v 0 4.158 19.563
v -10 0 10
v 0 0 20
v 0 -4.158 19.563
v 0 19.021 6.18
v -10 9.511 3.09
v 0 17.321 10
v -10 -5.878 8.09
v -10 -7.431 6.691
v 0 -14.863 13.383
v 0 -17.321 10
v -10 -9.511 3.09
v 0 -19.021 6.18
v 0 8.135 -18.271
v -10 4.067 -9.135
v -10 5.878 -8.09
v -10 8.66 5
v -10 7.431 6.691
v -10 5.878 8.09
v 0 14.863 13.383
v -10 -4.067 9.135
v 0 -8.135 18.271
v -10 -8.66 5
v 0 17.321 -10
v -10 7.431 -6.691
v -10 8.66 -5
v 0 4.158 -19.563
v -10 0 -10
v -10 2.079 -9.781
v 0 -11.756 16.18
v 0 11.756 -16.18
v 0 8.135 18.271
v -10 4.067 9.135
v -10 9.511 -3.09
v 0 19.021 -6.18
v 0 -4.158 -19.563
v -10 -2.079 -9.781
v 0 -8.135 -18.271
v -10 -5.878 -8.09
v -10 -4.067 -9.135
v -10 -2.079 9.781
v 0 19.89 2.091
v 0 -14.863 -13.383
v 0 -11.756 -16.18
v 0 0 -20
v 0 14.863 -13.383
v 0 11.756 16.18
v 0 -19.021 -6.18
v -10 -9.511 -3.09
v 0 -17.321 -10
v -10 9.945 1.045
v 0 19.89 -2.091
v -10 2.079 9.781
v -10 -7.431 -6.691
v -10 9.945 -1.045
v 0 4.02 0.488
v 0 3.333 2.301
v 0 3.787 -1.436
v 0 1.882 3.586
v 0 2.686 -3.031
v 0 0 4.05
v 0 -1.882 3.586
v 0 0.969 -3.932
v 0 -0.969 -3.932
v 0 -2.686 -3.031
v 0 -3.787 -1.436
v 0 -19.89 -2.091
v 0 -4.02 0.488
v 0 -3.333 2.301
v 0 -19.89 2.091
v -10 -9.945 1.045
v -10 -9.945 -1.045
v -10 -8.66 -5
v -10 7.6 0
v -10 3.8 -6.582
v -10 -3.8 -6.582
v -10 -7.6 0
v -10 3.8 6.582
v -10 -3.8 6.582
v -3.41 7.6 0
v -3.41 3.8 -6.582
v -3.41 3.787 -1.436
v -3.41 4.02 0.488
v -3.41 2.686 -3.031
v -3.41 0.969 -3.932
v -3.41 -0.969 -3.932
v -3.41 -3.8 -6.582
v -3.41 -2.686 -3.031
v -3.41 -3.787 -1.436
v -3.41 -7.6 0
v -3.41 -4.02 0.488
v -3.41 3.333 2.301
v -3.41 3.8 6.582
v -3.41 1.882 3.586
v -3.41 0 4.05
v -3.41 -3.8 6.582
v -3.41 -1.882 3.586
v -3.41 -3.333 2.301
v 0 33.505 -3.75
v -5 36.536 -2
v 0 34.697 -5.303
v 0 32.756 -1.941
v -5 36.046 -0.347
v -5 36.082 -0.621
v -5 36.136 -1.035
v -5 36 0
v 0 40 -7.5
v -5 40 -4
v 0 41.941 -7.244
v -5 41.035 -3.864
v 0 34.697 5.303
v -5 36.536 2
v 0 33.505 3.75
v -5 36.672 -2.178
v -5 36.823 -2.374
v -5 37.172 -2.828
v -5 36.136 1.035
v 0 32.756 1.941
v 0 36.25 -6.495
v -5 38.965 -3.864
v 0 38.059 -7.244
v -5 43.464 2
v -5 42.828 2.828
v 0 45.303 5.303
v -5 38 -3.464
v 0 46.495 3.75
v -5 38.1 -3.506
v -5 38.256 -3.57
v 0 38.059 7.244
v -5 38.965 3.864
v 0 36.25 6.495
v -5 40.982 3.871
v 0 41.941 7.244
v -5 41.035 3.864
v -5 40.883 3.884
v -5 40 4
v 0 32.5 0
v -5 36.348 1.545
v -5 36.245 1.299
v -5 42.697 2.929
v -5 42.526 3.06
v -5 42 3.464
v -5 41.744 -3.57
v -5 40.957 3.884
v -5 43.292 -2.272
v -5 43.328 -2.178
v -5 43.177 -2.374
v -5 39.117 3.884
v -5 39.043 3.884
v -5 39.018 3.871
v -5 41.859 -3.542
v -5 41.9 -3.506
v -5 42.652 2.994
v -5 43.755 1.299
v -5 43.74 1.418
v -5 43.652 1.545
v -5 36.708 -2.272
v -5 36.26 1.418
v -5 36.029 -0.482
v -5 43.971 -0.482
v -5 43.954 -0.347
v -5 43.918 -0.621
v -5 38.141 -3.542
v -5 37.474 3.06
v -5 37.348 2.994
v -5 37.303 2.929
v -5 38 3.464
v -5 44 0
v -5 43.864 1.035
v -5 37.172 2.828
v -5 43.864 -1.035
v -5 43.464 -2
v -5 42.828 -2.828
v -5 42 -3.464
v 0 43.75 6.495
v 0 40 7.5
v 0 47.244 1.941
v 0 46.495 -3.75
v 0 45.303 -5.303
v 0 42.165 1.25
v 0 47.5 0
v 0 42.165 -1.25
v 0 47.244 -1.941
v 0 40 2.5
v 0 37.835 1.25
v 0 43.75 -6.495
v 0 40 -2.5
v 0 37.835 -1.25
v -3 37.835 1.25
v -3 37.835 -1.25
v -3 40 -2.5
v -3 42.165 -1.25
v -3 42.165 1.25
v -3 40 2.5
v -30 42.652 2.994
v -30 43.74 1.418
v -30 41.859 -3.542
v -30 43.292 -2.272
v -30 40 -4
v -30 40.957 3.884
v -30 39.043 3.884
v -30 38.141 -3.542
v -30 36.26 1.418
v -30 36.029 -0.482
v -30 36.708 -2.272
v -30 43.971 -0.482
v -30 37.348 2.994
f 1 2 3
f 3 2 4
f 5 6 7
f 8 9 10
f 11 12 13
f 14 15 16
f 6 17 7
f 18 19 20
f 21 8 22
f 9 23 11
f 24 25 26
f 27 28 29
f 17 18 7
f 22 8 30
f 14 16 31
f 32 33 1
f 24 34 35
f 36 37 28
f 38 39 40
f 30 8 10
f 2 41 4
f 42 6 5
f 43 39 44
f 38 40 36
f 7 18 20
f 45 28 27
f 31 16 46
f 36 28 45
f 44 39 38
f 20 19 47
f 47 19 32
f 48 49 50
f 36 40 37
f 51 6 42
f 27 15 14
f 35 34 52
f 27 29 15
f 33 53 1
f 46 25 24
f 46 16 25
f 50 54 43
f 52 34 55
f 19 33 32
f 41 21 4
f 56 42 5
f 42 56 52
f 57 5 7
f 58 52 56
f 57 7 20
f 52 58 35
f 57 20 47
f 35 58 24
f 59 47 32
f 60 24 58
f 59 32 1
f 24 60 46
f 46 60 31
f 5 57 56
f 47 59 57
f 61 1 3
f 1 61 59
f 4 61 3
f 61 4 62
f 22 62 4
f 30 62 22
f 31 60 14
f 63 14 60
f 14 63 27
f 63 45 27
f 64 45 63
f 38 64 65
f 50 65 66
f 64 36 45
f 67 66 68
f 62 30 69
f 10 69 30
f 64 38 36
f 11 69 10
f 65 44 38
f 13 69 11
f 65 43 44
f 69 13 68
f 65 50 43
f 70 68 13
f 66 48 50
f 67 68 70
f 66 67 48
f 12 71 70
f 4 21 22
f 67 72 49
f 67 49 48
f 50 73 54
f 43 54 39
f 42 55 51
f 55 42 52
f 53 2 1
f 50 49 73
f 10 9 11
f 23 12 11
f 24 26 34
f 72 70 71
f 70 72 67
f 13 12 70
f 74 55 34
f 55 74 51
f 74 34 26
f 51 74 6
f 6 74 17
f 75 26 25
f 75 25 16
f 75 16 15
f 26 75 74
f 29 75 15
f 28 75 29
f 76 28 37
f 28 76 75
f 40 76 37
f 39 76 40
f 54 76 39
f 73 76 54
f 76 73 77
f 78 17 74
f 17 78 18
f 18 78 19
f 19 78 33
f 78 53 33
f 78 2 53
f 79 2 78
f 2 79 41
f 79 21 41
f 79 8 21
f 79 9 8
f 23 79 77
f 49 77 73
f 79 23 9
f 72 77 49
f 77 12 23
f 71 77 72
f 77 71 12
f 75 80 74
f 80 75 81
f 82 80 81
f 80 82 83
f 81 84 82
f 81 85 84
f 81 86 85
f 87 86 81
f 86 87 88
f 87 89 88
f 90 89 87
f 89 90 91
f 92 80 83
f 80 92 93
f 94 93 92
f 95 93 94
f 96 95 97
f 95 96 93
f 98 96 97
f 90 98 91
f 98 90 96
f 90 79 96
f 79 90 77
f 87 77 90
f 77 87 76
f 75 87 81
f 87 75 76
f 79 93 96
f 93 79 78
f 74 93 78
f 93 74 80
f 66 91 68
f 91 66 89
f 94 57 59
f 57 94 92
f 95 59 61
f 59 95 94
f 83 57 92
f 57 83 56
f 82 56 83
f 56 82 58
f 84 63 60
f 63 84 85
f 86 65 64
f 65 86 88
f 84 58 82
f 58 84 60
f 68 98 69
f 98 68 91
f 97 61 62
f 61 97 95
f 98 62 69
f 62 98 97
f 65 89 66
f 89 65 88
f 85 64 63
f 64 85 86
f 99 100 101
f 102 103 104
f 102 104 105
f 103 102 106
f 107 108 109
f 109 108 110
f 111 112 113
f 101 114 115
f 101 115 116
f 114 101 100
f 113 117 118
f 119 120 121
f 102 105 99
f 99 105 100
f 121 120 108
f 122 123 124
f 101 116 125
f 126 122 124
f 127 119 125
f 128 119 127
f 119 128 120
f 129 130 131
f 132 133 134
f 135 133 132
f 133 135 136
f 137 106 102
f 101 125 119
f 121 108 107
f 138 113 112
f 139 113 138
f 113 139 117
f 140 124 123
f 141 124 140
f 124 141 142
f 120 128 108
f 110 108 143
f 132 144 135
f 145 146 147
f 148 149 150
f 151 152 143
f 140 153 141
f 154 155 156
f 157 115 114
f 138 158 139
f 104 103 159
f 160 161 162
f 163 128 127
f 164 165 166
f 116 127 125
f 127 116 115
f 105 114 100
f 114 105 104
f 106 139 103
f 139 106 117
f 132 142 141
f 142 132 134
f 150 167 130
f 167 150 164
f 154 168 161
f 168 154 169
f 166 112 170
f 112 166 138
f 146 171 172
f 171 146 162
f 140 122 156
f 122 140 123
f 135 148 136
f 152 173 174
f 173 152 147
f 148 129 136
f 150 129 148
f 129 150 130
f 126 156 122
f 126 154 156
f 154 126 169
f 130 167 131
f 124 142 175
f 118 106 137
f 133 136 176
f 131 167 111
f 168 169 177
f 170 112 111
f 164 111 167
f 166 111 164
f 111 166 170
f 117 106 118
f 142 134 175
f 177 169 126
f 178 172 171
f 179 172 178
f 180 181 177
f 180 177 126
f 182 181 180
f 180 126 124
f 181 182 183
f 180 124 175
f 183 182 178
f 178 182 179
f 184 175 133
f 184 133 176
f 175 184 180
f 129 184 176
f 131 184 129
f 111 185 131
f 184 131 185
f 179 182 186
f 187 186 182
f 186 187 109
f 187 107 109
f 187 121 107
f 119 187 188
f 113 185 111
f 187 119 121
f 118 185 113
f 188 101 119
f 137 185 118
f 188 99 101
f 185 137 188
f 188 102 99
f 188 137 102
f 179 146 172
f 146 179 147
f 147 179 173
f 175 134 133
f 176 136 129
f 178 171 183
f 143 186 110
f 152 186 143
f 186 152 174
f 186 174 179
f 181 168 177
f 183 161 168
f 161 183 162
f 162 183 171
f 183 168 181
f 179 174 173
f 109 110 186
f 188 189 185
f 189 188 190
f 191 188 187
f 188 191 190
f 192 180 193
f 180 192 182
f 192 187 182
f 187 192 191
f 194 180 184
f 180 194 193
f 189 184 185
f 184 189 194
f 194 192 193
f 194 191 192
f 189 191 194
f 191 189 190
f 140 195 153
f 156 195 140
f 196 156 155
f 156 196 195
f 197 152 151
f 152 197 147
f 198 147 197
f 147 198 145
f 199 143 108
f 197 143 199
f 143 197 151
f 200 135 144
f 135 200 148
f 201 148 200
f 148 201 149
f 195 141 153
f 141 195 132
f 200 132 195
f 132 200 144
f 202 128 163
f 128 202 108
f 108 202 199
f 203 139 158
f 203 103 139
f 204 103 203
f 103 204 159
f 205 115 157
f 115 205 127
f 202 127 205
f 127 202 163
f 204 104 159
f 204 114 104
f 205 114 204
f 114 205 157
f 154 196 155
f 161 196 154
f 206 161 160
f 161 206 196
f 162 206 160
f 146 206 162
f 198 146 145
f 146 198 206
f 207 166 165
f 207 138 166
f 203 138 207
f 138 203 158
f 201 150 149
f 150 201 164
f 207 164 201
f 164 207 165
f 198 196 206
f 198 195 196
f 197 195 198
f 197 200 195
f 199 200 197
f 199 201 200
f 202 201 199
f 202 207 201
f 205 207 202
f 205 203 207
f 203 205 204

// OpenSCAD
use <MCAD/nuts_and_bolts.scad>;

nut_bump_M8();
translate([0,40,0]) bolt_M8();

module nut_bump_M8(h=10, tol=0.1) {
    
    rotate([0,-90,0]) 
        difference() {
            cylinder(d1=20+2*h, d2=20, h=h);
            
            translate([0,0,h+0.01])
                mirror([0,0,1]) 
                    rotate([0,0,90])
                        nutHole(8, tolerance=tol);
            
            translate([0,0,-1])
                cylinder(d=8+tol, h=h);
        }
}

module bolt_M8(length=30) {
    rotate([0,90,0])
        color("silver")
            union() {
                translate([0,0,-length])
                    cylinder(d=8,h=length-5);
                
                difference() {
                    translate([0,0,-5])
                        cylinder(d1=8,d2=15,h=5);
                    
                    cylinder(d=5, h=6, $fn = 6, center=true);
                }
            }
}
